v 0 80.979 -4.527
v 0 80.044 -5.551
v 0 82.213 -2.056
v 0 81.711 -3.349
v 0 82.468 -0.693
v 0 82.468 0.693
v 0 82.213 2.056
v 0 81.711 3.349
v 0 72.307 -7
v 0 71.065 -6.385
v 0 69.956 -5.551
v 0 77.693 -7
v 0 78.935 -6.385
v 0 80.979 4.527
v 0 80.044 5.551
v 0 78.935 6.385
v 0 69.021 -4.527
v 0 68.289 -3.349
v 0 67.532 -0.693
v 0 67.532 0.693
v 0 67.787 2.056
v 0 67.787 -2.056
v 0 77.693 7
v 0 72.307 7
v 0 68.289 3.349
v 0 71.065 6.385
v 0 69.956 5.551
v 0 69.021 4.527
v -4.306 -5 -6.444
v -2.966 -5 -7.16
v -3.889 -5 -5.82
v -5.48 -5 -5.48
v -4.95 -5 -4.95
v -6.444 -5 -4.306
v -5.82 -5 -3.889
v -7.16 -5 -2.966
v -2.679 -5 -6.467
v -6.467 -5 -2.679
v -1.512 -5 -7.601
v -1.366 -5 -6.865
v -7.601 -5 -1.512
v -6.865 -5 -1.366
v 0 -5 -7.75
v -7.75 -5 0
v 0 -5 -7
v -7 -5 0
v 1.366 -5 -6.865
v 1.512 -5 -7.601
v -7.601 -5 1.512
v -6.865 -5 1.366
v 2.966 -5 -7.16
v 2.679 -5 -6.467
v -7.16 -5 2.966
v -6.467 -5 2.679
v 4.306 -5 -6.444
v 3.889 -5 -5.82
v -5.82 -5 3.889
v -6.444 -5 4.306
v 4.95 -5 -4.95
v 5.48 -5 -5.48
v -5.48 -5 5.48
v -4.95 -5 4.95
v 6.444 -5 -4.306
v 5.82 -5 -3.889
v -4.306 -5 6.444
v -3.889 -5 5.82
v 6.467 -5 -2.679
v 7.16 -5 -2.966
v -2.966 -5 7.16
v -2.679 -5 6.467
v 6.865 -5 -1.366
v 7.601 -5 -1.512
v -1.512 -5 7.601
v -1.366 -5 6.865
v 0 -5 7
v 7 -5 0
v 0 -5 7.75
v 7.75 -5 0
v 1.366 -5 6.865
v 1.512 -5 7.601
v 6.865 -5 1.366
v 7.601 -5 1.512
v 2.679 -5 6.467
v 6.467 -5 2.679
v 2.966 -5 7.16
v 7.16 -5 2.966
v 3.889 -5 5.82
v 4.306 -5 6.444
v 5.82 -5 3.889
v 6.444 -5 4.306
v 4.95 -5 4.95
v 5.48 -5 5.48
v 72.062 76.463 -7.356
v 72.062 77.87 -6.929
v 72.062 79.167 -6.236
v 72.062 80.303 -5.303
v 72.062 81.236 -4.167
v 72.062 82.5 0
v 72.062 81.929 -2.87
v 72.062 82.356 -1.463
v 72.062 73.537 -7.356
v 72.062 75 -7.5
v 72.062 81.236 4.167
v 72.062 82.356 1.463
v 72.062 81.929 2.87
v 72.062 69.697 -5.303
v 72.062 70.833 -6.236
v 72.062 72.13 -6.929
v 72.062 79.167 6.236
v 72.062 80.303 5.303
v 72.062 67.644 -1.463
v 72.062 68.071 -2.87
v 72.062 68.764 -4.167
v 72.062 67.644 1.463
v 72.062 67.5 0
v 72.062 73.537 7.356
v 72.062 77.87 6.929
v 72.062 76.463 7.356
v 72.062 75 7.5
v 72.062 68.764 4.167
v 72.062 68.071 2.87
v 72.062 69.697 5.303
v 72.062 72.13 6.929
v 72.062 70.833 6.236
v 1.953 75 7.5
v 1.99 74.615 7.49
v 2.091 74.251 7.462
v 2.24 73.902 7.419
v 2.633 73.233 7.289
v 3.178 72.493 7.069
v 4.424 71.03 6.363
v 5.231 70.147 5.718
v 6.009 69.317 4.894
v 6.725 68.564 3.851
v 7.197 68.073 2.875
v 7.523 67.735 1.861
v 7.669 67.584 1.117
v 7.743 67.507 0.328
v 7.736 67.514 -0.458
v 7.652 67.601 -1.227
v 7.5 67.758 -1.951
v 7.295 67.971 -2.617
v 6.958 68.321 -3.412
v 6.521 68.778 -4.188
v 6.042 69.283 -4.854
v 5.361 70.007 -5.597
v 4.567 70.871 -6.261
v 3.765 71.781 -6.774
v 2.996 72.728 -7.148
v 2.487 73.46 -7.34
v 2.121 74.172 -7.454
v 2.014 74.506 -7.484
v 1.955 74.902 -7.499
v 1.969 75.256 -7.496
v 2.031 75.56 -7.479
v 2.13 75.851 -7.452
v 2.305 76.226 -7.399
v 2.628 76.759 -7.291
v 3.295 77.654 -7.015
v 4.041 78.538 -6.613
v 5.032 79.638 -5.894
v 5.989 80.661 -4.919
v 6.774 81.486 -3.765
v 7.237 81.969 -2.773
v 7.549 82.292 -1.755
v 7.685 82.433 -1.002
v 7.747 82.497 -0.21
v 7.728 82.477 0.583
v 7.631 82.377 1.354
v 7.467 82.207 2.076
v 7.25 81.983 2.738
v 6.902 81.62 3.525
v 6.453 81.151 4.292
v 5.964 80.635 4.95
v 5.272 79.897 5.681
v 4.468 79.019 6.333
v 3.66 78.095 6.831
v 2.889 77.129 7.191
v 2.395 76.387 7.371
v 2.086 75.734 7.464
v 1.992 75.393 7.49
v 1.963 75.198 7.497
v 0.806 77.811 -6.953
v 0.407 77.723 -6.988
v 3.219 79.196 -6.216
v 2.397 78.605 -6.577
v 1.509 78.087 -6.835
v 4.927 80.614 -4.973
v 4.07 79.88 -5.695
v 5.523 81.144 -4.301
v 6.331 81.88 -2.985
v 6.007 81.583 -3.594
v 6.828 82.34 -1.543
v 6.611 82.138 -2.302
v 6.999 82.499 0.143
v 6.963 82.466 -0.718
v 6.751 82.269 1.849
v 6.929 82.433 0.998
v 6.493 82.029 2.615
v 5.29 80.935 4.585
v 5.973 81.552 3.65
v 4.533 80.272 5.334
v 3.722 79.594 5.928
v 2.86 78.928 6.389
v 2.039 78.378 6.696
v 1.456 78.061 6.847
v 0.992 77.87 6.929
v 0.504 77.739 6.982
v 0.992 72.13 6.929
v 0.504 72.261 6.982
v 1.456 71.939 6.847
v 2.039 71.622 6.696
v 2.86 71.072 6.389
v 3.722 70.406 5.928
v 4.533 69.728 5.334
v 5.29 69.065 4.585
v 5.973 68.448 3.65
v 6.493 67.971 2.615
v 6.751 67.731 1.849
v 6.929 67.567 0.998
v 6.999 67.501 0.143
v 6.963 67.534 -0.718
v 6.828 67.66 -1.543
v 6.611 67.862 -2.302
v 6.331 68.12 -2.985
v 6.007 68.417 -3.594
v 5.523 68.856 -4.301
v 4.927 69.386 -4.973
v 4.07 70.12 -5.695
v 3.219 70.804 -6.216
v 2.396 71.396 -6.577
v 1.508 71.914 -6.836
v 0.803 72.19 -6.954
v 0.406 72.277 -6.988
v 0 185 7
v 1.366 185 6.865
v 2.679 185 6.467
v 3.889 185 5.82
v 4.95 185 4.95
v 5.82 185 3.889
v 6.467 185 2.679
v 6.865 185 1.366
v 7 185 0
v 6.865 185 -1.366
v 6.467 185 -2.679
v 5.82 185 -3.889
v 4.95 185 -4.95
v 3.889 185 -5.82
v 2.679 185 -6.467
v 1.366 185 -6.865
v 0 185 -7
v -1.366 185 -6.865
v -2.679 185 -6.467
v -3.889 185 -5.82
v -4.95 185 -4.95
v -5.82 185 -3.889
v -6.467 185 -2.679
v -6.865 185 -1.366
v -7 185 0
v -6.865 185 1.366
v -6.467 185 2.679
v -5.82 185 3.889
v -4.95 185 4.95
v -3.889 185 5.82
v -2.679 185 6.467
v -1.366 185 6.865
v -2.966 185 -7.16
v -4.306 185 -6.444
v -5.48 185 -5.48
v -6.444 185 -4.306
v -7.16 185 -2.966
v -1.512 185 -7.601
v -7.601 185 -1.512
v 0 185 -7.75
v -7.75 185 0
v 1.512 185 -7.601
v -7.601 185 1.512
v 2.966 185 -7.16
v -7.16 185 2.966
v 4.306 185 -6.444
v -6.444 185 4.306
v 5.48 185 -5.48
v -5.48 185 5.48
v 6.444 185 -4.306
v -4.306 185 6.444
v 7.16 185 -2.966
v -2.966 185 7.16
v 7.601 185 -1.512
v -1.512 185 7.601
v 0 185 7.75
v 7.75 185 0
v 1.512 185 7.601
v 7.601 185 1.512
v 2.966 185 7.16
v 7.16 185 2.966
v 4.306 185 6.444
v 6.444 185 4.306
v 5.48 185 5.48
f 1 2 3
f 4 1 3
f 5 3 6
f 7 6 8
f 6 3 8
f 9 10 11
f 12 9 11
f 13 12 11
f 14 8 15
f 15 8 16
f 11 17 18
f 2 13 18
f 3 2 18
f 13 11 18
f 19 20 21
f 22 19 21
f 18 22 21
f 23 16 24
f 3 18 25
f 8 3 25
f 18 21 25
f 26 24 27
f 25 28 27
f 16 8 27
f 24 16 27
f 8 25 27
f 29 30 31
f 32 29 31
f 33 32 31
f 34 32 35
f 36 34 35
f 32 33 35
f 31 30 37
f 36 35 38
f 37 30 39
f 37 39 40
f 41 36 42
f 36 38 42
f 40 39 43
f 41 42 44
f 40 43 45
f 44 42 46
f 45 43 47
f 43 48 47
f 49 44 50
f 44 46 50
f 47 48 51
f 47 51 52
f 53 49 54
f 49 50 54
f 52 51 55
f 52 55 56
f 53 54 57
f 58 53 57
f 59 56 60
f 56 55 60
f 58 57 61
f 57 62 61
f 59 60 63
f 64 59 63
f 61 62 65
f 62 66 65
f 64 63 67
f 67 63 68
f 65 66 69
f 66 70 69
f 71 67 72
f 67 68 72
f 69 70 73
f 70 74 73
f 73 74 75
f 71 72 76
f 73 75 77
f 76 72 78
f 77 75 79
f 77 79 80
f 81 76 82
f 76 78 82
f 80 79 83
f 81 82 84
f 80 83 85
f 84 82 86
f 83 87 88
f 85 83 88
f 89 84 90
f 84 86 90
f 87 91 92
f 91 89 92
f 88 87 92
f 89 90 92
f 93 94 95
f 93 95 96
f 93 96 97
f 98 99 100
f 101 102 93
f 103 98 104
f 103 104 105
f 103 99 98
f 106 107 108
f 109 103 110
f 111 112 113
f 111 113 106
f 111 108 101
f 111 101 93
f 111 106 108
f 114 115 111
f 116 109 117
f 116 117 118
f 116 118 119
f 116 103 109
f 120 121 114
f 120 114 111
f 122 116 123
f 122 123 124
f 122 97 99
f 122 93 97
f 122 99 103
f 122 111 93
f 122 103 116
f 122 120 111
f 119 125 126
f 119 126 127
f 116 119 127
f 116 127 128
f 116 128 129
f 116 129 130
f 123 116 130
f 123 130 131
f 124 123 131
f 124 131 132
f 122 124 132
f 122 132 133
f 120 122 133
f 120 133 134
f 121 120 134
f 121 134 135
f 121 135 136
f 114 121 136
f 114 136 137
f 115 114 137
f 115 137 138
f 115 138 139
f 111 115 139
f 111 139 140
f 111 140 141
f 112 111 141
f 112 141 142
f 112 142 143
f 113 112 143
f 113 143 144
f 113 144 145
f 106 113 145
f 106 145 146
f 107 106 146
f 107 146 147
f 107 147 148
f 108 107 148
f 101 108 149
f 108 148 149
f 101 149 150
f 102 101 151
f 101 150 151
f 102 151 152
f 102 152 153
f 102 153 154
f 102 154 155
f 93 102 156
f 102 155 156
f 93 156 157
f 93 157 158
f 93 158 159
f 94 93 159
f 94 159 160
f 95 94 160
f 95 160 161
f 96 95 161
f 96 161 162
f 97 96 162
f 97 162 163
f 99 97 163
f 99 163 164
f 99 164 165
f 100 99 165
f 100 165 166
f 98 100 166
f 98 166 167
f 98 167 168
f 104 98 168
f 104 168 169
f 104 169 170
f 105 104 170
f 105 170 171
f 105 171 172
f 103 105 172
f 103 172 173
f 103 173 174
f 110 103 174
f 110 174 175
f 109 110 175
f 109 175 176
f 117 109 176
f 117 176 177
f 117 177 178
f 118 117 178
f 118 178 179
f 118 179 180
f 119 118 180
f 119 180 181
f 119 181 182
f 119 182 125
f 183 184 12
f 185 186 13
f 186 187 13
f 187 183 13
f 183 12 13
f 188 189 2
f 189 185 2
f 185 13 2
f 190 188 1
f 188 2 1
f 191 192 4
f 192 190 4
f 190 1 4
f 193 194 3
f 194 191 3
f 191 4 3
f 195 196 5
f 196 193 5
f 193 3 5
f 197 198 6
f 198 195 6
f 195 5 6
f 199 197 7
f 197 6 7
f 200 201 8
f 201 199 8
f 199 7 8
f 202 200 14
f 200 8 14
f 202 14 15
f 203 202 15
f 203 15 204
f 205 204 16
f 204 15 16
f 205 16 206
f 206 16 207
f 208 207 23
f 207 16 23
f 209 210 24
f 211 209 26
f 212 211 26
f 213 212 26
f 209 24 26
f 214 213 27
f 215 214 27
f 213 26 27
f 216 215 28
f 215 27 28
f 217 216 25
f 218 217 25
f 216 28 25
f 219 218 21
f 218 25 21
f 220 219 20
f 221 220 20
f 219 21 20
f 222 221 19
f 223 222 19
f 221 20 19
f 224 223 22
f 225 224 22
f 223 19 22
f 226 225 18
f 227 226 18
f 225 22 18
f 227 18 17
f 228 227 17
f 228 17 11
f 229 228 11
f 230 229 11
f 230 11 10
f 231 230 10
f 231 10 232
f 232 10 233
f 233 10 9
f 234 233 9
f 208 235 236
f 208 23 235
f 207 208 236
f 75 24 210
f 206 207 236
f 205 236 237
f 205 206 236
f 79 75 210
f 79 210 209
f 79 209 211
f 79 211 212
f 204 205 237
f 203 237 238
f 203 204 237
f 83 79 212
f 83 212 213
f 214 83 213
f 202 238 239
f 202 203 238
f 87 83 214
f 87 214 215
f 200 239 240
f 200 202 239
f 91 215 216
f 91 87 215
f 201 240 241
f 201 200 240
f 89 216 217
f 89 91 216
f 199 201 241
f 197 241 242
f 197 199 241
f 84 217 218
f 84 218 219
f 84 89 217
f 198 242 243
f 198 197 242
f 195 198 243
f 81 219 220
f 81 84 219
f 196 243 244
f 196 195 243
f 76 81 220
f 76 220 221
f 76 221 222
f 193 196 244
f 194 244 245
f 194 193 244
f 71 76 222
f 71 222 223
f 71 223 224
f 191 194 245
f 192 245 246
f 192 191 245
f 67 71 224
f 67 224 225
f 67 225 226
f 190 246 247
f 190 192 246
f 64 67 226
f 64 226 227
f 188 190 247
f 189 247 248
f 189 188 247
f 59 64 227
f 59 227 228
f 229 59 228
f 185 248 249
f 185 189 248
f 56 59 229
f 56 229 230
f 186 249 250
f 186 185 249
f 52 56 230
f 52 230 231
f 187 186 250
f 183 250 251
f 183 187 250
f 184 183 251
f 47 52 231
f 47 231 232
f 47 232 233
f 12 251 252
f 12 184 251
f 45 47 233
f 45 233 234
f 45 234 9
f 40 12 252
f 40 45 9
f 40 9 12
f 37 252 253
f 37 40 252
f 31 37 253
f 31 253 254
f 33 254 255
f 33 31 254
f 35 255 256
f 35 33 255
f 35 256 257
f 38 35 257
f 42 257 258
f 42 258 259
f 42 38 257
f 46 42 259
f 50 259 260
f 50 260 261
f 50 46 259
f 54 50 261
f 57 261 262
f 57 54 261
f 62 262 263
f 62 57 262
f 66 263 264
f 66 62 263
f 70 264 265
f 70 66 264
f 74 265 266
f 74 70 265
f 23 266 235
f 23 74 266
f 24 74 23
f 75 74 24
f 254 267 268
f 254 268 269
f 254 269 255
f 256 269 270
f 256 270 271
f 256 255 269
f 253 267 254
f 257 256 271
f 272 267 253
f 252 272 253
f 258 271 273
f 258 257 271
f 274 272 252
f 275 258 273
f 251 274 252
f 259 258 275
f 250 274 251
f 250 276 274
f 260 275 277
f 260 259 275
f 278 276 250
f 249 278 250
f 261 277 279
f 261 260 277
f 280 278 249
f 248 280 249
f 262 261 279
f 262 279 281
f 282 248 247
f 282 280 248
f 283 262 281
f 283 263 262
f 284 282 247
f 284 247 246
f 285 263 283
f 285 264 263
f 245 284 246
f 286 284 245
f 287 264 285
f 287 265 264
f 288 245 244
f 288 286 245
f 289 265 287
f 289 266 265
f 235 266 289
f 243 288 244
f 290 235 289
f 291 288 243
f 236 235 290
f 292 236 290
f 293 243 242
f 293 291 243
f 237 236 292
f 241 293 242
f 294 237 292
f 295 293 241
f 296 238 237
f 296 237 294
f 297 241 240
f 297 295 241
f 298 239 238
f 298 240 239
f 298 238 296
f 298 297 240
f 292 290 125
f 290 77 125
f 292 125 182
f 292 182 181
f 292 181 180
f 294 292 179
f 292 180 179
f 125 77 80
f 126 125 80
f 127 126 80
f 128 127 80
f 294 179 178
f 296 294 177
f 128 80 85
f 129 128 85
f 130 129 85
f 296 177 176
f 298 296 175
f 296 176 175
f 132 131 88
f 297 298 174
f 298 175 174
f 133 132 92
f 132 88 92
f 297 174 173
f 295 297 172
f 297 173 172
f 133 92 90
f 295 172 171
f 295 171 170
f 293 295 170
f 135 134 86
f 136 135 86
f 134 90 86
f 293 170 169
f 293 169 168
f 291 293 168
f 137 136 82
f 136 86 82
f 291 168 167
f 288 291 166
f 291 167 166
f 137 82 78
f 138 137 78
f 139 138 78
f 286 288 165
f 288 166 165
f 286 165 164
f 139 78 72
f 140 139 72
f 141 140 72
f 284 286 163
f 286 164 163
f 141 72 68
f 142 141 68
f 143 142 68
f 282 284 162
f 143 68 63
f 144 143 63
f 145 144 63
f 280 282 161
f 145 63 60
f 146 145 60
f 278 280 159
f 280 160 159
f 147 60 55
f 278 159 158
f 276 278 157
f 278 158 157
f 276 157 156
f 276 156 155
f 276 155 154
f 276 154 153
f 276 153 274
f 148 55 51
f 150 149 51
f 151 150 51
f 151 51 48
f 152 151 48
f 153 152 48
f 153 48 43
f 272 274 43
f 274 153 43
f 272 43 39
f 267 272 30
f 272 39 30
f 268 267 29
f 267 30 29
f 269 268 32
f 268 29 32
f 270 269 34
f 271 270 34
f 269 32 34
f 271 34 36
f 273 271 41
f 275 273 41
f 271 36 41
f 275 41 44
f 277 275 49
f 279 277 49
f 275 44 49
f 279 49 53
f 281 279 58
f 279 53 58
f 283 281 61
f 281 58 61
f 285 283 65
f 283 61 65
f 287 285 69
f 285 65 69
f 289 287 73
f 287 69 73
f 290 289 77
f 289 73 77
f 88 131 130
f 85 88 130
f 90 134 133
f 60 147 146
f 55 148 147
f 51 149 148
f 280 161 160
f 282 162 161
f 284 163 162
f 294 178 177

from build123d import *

# Parameters (mm, degrees)
BOSS_EXTRUDE1_DEPTH      = 160
BOSS_EXTRUDE1_DEPTH_BACK = 5
SKETCH1_R                = 7.75
SKETCH1_R_2              = 7
SKETCH5_R                = 7.5
BOSS_EXTRUDE3_DEPTH      = 72.0622032
SKETCH7_R                = 7.75
SKETCH7_R_2              = 7
BOSS_EXTRUDE5_DEPTH      = 25


with BuildPart() as part:
    # Sketch1 → Boss-Extrude1 (new, two sides: drawn at the far end of the back side and taken through both)
    with BuildSketch(Plane(origin=(0, 0, 0), x_dir=(1, 0, 0), z_dir=(0, 1, 0)).offset(-BOSS_EXTRUDE1_DEPTH_BACK)):
        with Locations(Location((0, 0, 0), (0, 0, 270))):
            Circle(SKETCH1_R)
        with Locations(Location((0, 0, 0), (0, 0, 270))):
            Circle(SKETCH1_R_2, mode=Mode.SUBTRACT)
    extrude(amount=BOSS_EXTRUDE1_DEPTH + BOSS_EXTRUDE1_DEPTH_BACK)

    # Sketch5 → Boss-Extrude3 (add)
    with BuildSketch(Plane(origin=(0, 0, 0), x_dir=(0, 0, -1), z_dir=(1, 0, 0))):
        with Locations(Location((0, 75, 0), (0, 0, 180))):
            Circle(SKETCH5_R)
    extrude(amount=BOSS_EXTRUDE3_DEPTH)

    # Sketch7 → Boss-Extrude5 (add)
    with BuildSketch(Plane(origin=(0, 160, 0), x_dir=(1, 0, 0), z_dir=(0, 1, 0))):
        with Locations(Location((0, 0, 0), (0, 0, 270))):
            Circle(SKETCH7_R)
        with Locations(Location((0, 0, 0), (0, 0, 270))):
            Circle(SKETCH7_R_2, mode=Mode.SUBTRACT)
    extrude(amount=BOSS_EXTRUDE5_DEPTH)


solid = part.part
